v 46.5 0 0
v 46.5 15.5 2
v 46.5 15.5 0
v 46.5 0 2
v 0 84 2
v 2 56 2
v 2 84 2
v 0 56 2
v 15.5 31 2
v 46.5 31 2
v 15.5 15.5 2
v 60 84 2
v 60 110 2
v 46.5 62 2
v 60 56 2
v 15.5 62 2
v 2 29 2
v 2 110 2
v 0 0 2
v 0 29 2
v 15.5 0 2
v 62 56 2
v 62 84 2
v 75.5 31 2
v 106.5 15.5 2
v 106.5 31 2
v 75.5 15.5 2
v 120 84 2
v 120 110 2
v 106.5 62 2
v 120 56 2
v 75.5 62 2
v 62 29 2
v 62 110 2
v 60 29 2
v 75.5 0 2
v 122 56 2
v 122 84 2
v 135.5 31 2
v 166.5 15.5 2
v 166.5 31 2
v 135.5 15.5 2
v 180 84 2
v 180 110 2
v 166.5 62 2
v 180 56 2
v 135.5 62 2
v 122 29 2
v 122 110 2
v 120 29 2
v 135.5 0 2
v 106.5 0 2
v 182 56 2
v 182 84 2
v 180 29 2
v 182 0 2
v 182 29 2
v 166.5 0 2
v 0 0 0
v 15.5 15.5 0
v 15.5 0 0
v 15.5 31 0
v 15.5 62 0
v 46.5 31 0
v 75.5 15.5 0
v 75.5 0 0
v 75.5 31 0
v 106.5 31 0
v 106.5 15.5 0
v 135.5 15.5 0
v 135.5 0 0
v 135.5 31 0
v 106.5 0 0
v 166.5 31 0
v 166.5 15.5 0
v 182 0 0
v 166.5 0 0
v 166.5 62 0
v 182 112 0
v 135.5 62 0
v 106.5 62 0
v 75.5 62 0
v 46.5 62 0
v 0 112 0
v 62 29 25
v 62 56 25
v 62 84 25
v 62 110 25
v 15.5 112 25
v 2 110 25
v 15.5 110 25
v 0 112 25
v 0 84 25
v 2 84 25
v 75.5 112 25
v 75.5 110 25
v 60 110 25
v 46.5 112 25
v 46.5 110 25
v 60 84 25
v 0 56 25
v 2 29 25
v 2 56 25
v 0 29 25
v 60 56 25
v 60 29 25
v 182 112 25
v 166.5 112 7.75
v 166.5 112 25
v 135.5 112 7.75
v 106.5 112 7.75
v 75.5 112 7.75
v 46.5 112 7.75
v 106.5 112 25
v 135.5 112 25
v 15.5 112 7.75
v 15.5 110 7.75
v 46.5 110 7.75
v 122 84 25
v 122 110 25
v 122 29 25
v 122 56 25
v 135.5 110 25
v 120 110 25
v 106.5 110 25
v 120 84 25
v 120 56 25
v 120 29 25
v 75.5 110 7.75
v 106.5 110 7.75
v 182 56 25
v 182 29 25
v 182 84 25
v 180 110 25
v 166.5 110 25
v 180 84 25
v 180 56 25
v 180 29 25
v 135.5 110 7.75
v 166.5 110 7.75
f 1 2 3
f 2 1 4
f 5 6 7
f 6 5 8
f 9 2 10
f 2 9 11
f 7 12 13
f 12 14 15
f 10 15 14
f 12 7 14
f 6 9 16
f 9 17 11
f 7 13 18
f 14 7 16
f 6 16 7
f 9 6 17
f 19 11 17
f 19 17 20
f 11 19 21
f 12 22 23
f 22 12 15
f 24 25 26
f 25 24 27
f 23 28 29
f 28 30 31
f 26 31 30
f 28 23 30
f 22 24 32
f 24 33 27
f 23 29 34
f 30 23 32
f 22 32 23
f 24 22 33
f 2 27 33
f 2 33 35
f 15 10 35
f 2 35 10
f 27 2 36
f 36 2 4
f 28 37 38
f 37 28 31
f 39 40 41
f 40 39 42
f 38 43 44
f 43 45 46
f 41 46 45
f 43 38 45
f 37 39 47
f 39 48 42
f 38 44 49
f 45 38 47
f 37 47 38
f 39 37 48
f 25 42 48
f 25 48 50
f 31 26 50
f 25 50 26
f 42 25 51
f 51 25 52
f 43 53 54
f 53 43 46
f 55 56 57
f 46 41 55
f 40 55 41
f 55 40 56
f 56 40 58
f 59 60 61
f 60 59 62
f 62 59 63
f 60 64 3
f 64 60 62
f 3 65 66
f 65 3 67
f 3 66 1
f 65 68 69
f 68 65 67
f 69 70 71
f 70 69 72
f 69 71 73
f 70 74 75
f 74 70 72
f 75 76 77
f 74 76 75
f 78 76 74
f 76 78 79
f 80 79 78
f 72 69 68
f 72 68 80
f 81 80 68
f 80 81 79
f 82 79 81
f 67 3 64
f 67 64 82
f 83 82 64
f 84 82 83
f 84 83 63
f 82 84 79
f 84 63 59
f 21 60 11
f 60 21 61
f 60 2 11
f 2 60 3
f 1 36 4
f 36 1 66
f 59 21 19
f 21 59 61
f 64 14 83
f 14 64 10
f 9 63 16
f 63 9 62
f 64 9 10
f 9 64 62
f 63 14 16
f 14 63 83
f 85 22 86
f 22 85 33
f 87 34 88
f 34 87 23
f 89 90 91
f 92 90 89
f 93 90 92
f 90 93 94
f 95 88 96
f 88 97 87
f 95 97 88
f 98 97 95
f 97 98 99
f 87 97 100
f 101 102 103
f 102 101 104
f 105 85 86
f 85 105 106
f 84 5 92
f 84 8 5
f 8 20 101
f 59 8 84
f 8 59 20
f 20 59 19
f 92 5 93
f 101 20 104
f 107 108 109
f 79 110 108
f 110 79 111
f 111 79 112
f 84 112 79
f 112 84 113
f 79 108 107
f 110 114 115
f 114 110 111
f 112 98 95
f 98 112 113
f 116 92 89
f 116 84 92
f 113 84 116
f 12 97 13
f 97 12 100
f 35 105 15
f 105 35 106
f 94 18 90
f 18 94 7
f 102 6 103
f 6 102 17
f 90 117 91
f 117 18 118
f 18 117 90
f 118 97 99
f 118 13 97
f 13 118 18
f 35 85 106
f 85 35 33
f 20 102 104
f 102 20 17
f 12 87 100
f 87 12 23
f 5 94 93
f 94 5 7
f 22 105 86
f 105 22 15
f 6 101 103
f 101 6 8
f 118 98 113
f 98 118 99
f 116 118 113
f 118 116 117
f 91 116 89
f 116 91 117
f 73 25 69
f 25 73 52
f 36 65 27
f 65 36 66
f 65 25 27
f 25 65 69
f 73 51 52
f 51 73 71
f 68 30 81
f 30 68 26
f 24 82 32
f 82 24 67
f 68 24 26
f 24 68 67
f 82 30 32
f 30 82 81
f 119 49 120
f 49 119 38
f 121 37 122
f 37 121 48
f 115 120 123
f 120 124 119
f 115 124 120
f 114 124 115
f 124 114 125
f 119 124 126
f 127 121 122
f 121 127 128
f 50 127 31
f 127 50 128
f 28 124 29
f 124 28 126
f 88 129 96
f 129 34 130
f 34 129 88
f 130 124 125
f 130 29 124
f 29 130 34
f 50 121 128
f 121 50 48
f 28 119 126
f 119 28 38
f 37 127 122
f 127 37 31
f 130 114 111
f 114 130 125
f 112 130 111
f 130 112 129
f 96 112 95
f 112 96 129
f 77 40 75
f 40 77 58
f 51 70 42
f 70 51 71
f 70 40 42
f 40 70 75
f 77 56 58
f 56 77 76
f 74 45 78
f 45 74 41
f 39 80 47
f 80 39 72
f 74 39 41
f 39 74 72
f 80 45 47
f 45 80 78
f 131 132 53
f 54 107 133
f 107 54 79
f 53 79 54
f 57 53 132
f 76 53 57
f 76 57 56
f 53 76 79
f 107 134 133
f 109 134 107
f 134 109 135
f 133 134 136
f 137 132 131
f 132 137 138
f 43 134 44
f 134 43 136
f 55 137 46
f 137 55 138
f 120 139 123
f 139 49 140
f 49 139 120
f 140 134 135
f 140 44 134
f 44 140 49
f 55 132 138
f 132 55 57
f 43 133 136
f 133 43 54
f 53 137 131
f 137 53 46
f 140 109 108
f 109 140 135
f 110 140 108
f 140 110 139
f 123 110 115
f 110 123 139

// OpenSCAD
// file: card-holder.scad
module holder(card_width, card_length, deck_thickness) {
    wall_thickness  = 2;
    part_width      = card_width  + (wall_thickness * 2);
    part_length     = card_length +  wall_thickness;
    part_height     = deck_thickness * 1.25;
    slot_width      = part_width / 2;
    slot_offset     = part_width / 4;

    difference() {
        // Create a solid cube.
        cube([part_width, part_length, part_height]);

        // Remove the section the cards actually sit in.
        translate([wall_thickness, -wall_thickness, wall_thickness])
            cube([card_width, part_length, part_height]);

        // Bottom slots.
        for (i=[0,2,3])
            translate([slot_offset, slot_offset * i, 0])
                cube([slot_width, slot_offset, wall_thickness]);
        
        // Side slots.
        translate([0, 0, wall_thickness])
            cube([part_width, part_length / 4 + 1, part_height]);

        translate([0, (part_length / 2), wall_thickness])
            cube([part_width, part_length / 4, part_height]);

        *for (i=[0,2,3])
            translate([0, slot_offset * i, wall_thickness])
                cube([part_width,
                      slot_offset,
                      part_height]);//part_height - (slot_offset / 2)]);

        // Rear slot.
        translate([slot_offset, part_length - wall_thickness, slot_offset / 2])
            cube([slot_width, wall_thickness, part_height]);
    }
}

// NOTE: render() makes it the preview not look weird, but performs worse.
render() {
    holder(card_width=65, card_length=85, deck_thickness=20);
}

// % = show it in the preview, but not the final render.
% render() {
    translate([0, 87, 27])
        rotate([180, 0, 0])
            holder(card_width=65, card_length=85, deck_thickness=20);
}
// main file
// Can be used to hold the Items, Events, and Omens decks for
// Betrayal at the House on the Hill.

use <card-holder.scad>;

// NOTE: render() makes it the preview not look weird, but performs worse.
render() {
    union() {
        for(i=[0,1,2])
            translate([i*60, 0, 0])
                holder(card_width=58, card_length=110, deck_thickness=20);
    }
}

// % = show it in the preview, but not the final render.
% render() {
    union() {
        rotate([180, 0, 0])
            translate([0, -112, -27])
                for(i=[0,1,2])
                    translate([i*60, 0, 0])
                        holder(card_width=58,
                                card_length=110,
                                deck_thickness=20);
    }
}
